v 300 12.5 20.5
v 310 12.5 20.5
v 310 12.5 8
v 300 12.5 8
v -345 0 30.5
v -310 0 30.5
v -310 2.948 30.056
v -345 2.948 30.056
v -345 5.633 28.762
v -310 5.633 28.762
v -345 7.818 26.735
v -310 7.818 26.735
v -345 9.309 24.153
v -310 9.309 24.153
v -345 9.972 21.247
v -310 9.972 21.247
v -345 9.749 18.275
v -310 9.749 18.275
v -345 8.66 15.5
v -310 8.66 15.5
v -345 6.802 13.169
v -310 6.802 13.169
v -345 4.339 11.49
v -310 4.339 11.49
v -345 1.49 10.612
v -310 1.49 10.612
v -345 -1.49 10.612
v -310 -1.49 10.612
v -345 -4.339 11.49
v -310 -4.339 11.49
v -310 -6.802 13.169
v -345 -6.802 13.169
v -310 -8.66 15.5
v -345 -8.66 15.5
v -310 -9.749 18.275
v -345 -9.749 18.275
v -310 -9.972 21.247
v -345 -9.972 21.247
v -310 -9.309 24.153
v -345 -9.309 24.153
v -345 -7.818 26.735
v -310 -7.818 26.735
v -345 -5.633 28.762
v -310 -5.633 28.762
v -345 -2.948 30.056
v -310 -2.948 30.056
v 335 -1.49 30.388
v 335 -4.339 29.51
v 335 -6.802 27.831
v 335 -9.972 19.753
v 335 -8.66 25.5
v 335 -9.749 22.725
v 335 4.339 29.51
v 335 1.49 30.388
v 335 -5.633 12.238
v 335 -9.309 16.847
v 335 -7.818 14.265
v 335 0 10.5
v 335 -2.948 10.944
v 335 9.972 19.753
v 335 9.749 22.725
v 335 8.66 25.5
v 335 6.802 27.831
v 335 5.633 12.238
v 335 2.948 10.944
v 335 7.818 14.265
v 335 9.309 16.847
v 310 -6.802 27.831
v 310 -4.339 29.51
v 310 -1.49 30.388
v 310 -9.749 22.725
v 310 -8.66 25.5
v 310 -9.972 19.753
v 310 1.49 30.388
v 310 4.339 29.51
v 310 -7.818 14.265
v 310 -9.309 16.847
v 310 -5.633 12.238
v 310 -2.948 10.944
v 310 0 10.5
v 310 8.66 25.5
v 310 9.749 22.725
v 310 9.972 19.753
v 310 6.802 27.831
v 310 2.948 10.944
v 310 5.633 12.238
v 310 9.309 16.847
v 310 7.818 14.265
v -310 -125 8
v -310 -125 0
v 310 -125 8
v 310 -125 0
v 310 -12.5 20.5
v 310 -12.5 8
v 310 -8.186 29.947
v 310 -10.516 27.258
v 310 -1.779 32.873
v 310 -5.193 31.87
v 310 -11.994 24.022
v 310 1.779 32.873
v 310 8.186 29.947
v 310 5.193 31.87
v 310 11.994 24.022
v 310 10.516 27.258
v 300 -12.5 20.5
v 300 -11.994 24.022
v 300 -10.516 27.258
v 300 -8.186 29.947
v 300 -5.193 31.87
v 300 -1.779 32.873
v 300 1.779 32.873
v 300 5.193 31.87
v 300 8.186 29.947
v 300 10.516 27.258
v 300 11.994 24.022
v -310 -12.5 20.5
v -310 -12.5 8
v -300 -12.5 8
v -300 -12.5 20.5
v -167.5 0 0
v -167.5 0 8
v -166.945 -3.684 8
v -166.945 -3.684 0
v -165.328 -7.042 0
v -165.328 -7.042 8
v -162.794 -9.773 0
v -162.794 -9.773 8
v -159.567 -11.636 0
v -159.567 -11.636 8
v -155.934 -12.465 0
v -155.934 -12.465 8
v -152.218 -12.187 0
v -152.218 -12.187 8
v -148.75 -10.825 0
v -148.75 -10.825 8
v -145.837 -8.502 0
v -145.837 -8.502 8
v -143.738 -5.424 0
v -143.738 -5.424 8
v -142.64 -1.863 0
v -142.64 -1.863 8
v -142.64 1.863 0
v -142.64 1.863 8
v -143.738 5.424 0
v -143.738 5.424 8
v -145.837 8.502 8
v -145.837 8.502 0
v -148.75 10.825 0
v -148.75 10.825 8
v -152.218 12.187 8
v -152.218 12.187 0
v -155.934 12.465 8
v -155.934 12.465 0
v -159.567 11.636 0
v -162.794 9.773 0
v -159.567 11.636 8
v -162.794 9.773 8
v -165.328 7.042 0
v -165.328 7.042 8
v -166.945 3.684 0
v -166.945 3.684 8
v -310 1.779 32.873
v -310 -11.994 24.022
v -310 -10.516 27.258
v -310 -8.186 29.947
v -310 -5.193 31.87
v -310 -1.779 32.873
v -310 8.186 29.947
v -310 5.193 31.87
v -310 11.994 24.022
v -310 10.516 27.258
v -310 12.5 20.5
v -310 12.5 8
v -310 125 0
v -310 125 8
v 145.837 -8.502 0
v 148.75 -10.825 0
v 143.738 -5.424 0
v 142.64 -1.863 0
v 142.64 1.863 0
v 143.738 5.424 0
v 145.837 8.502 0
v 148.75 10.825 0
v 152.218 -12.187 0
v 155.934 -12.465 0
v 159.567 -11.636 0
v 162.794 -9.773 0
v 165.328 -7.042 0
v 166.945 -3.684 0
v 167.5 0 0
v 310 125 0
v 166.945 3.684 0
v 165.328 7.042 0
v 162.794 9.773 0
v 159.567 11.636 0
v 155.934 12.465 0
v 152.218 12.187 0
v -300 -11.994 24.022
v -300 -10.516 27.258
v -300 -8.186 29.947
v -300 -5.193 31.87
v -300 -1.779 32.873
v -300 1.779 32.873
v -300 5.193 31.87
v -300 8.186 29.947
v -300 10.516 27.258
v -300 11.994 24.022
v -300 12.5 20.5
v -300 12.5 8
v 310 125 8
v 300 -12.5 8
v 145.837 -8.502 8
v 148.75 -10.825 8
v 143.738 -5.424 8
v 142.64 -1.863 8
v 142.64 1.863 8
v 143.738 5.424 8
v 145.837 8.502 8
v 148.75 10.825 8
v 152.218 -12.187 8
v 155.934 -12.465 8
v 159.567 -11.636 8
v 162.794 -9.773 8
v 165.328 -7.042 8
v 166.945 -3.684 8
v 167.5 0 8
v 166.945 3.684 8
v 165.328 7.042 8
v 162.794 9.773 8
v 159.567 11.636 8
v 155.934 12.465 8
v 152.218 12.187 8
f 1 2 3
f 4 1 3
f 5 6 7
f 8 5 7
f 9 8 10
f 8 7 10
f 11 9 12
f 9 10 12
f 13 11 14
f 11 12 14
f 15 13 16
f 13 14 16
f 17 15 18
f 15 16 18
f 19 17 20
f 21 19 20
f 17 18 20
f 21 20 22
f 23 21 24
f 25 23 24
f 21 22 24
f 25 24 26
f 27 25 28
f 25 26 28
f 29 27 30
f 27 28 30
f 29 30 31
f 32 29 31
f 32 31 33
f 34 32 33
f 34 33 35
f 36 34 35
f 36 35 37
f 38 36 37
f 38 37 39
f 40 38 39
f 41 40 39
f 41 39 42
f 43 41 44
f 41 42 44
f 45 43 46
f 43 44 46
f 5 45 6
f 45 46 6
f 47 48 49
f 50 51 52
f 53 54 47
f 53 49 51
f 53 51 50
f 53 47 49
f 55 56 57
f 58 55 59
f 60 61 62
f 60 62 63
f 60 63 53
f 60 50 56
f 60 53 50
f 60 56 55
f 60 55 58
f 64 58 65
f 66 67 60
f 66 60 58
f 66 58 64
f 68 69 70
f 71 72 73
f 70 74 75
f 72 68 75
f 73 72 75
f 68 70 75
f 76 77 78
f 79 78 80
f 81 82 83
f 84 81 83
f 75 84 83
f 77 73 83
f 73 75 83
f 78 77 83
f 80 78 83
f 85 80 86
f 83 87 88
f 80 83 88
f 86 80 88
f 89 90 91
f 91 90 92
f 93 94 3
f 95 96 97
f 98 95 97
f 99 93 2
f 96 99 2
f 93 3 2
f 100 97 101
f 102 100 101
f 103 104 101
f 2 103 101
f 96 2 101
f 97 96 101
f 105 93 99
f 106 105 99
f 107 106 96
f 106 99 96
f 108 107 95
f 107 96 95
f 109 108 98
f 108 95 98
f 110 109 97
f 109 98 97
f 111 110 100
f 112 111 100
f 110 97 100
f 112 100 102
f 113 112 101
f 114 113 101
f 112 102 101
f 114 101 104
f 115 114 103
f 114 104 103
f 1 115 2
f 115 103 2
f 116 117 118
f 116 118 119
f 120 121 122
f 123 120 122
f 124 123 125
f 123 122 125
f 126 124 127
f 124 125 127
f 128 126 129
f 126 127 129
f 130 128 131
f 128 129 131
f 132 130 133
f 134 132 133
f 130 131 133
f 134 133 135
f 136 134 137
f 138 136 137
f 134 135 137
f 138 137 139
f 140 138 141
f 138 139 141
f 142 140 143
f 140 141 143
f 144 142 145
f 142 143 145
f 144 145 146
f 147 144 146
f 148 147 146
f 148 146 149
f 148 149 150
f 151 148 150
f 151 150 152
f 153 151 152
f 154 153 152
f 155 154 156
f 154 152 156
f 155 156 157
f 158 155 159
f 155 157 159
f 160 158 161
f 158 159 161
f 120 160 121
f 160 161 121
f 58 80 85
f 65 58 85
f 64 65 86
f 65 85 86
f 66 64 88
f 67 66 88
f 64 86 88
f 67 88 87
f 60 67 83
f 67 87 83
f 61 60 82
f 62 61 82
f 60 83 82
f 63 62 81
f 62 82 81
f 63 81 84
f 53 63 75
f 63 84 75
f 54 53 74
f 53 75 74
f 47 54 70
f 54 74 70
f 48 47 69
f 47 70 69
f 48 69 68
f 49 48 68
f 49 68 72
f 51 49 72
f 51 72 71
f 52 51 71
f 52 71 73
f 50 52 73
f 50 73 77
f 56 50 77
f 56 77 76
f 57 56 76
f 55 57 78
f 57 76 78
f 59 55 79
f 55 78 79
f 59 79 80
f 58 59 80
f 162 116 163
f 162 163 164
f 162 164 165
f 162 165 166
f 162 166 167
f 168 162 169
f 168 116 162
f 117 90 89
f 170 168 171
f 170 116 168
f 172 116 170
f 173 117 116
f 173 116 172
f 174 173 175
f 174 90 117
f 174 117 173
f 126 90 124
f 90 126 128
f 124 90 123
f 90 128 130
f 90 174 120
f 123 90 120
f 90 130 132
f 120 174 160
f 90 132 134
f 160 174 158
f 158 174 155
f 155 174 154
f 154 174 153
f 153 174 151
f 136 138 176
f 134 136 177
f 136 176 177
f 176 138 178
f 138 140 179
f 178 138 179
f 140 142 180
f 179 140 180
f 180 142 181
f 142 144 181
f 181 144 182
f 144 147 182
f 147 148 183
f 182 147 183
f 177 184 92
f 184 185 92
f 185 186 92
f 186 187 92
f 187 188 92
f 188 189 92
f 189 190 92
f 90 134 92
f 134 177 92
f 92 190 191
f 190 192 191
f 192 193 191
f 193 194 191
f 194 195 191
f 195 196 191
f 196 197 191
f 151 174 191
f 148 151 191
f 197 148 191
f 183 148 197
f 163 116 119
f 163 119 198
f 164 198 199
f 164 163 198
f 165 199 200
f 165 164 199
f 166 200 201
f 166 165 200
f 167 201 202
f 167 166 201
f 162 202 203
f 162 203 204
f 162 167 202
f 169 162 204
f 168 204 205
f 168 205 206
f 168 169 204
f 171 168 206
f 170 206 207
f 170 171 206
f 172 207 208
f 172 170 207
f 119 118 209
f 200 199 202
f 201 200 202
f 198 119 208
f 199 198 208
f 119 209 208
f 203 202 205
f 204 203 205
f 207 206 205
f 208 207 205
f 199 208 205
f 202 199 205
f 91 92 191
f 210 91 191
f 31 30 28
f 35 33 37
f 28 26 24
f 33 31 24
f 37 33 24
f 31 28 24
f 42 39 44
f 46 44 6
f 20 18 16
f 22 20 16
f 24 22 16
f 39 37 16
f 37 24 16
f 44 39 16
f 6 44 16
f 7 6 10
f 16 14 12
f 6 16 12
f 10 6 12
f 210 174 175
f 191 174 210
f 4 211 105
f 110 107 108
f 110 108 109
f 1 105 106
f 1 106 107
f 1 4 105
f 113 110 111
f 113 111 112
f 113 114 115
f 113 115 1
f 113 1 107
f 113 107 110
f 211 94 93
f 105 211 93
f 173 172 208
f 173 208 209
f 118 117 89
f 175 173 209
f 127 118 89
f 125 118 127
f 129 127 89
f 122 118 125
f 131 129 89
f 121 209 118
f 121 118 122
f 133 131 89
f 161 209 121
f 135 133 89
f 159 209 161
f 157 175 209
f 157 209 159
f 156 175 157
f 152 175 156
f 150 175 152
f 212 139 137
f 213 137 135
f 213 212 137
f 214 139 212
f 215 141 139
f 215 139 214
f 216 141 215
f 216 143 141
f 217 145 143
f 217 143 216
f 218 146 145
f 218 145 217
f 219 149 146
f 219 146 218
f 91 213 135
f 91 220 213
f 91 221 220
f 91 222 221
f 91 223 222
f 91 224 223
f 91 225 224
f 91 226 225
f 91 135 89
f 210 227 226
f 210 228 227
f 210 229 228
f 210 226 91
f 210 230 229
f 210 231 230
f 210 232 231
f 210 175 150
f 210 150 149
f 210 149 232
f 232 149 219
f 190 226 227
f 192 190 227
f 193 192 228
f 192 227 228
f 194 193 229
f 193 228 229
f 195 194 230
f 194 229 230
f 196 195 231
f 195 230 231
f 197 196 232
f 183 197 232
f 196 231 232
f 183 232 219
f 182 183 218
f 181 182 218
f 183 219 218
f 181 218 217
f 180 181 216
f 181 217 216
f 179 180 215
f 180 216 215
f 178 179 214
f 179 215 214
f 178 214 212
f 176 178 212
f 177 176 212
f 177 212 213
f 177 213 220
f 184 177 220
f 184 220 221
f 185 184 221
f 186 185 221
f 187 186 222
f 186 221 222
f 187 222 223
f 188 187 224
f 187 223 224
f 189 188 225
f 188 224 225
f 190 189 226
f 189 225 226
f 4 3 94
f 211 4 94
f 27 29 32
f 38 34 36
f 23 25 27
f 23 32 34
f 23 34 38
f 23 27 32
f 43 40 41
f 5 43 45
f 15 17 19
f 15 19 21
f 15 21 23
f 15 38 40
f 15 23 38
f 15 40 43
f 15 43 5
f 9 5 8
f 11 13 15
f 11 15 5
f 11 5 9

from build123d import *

# Parameters (mm, degrees)
SKETCH1_W           = 620
SKETCH1_H           = 250
BOSS_EXTRUDE1_DEPTH = 8
SKETCH2_R           = 12.5
CUT_EXTRUDE1_DEPTH  = 8
BOSS_EXTRUDE2_DEPTH = 10
SKETCH4_R           = 10
BOSS_EXTRUDE3_DEPTH = 25
SKETCH5_R           = 10
BOSS_EXTRUDE4_DEPTH = 35


with BuildPart() as part:
    # Sketch1 → Boss-Extrude1 (new body)
    with BuildSketch(Plane.XY):
        Rectangle(SKETCH1_W, SKETCH1_H)
    extrude(amount=BOSS_EXTRUDE1_DEPTH)

    # Sketch2 → Cut-Extrude1 (cut)
    with BuildSketch(Plane.XY.offset(8)):
        with Locations((155, 0)):
            Circle(SKETCH2_R)
        with Locations(Location((-155, 0, 0), (0, 0, 180))):
            Circle(SKETCH2_R)
    extrude(amount=-CUT_EXTRUDE1_DEPTH, mode=Mode.SUBTRACT)


with BuildPart() as body_2:
    # Sketch3 → Boss-Extrude2 (new body)
    with BuildSketch(Plane(origin=(310, 0, 0), x_dir=(0, 0, -1), z_dir=(1, 0, 0))):
        with BuildLine():
            Line((-20.5, 12.5), (-8, 12.5))
            Line((-8, 12.5), (-8, -12.5))
            Line((-8, -12.5), (-20.5, -12.5))
            ThreePointArc((-20.5, -12.5), (-33, 0), (-20.5, 12.5))
        make_face()
    boss_extrude2 = extrude(amount=-BOSS_EXTRUDE2_DEPTH)


with BuildPart() as body_3:
    # Sketch4 → Boss-Extrude3 (new body)
    with BuildSketch(Plane(origin=(310, 0, 0), x_dir=(0, 0, -1), z_dir=(1, 0, 0))):
        with Locations((-20.5, 0)):
            Circle(SKETCH4_R)
    extrude(amount=BOSS_EXTRUDE3_DEPTH)


with BuildPart() as part_1:
    add(part.part)

    # Mirror2: Boss-Extrude2 across plane
    add(boss_extrude2.mirror(Plane(origin=(0, 0, 0), x_dir=(0, 0, 1), z_dir=(1, 0, 0))))


with BuildPart() as body_4:
    # Sketch5 → Boss-Extrude4 (new body)
    with BuildSketch(Plane.ZY.offset(310)):
        with Locations((20.5, 0)):
            Circle(SKETCH5_R)
    extrude(amount=BOSS_EXTRUDE4_DEPTH)


solid = Compound([body_2.part, body_3.part, part_1.part, body_4.part])
